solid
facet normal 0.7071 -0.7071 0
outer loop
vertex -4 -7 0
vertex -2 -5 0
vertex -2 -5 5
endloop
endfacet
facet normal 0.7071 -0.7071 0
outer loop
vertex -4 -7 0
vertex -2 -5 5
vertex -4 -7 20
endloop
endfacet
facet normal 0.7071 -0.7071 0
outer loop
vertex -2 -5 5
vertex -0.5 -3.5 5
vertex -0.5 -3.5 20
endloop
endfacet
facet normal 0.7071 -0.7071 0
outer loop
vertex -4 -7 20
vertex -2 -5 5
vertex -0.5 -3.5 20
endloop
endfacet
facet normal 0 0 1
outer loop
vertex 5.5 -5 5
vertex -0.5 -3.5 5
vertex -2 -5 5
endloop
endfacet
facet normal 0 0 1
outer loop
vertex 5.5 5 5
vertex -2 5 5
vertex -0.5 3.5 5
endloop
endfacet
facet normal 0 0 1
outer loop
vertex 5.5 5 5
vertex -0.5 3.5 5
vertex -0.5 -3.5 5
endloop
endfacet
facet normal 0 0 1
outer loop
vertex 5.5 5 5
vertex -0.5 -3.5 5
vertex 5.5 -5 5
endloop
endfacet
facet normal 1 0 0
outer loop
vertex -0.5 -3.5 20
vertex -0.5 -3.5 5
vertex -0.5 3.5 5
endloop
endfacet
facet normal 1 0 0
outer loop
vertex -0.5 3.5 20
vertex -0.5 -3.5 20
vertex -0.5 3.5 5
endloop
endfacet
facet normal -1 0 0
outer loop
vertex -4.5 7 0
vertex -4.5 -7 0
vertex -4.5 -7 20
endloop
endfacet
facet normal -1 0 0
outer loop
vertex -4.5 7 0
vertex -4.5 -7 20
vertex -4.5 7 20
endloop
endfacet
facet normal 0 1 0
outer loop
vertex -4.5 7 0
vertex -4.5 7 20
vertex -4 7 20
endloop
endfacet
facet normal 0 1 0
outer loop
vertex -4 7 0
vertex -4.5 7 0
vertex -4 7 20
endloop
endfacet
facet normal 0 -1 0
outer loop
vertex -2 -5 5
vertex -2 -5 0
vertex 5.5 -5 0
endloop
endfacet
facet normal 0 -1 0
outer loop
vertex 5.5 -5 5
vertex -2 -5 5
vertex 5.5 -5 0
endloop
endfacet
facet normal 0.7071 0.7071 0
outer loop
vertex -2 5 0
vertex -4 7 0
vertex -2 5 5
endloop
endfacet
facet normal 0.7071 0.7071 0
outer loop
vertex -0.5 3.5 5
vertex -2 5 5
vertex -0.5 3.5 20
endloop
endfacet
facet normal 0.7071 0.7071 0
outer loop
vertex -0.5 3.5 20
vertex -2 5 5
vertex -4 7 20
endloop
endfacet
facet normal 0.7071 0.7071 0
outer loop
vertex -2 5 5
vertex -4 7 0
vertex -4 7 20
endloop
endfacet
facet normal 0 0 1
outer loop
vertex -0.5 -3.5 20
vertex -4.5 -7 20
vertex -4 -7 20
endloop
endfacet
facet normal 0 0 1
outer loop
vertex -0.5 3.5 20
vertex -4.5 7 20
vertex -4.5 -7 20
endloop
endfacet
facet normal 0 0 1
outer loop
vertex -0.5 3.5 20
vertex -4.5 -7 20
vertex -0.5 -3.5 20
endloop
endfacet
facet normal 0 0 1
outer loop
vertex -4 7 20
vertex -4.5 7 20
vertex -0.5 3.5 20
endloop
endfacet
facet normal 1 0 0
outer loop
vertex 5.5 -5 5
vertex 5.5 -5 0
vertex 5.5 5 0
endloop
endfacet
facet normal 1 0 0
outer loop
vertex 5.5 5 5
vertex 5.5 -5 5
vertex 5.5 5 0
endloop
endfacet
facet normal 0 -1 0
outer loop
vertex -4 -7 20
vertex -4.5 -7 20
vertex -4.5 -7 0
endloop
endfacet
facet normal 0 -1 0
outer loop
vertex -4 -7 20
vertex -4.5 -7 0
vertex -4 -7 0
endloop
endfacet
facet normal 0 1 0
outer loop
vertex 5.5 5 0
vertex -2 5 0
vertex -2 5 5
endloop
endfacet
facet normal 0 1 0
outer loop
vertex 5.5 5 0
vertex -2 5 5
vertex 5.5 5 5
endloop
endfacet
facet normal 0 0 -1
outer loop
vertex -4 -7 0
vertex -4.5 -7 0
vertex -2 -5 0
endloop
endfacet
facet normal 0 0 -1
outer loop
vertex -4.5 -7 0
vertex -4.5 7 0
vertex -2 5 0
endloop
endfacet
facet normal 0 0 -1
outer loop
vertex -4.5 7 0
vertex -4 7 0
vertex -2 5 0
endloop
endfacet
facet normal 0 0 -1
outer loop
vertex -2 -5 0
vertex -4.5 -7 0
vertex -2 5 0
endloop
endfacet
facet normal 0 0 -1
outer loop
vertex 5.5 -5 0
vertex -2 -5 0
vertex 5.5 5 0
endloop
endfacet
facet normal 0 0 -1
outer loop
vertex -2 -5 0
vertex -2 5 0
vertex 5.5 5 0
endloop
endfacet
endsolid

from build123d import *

# Parameters (mm, degrees)
BOX042_W                                         = 10
BOX042_H                                         = 10
BOX042_DEPTH                                     = 5
BOX041_W                                         = 4
BOX041_H                                         = 14
BOX041_DEPTH                                     = 20
CHAMFER004013007011015006009007001005003019_SIZE = 3.5


with BuildPart() as cube042:
    # Box042 → Box042 (new body)
    with BuildSketch(Plane(origin=(-4.5, -5, 0), x_dir=(1, 0, 0), z_dir=(0, 0, 1))):
        with Locations((5, 5)):
            Rectangle(BOX042_W, BOX042_H)
    extrude(amount=BOX042_DEPTH)


with BuildPart() as block_remover_btm:
    # Box041 → Box041 (new body)
    with BuildSketch(Plane(origin=(-4.5, -7, 0), x_dir=(1, 0, 0), z_dir=(0, 0, 1))):
        with Locations((2, 7)):
            Rectangle(BOX041_W, BOX041_H)
    extrude(amount=BOX041_DEPTH)

    # Chamfer004013007011015006009007001005003019
    chamfer004013007011015006009007001005003019_edges = [block_remover_btm.edges().sort_by_distance(p)[0] for p in [
        (-0.5, -7, 10),
        (-0.5, 7, 10),
    ]]
    chamfer(chamfer004013007011015006009007001005003019_edges, length=CHAMFER004013007011015006009007001005003019_SIZE)

    # Fusion004025023011: union Cube042
    add(cube042.part)


solid = block_remover_btm.part
